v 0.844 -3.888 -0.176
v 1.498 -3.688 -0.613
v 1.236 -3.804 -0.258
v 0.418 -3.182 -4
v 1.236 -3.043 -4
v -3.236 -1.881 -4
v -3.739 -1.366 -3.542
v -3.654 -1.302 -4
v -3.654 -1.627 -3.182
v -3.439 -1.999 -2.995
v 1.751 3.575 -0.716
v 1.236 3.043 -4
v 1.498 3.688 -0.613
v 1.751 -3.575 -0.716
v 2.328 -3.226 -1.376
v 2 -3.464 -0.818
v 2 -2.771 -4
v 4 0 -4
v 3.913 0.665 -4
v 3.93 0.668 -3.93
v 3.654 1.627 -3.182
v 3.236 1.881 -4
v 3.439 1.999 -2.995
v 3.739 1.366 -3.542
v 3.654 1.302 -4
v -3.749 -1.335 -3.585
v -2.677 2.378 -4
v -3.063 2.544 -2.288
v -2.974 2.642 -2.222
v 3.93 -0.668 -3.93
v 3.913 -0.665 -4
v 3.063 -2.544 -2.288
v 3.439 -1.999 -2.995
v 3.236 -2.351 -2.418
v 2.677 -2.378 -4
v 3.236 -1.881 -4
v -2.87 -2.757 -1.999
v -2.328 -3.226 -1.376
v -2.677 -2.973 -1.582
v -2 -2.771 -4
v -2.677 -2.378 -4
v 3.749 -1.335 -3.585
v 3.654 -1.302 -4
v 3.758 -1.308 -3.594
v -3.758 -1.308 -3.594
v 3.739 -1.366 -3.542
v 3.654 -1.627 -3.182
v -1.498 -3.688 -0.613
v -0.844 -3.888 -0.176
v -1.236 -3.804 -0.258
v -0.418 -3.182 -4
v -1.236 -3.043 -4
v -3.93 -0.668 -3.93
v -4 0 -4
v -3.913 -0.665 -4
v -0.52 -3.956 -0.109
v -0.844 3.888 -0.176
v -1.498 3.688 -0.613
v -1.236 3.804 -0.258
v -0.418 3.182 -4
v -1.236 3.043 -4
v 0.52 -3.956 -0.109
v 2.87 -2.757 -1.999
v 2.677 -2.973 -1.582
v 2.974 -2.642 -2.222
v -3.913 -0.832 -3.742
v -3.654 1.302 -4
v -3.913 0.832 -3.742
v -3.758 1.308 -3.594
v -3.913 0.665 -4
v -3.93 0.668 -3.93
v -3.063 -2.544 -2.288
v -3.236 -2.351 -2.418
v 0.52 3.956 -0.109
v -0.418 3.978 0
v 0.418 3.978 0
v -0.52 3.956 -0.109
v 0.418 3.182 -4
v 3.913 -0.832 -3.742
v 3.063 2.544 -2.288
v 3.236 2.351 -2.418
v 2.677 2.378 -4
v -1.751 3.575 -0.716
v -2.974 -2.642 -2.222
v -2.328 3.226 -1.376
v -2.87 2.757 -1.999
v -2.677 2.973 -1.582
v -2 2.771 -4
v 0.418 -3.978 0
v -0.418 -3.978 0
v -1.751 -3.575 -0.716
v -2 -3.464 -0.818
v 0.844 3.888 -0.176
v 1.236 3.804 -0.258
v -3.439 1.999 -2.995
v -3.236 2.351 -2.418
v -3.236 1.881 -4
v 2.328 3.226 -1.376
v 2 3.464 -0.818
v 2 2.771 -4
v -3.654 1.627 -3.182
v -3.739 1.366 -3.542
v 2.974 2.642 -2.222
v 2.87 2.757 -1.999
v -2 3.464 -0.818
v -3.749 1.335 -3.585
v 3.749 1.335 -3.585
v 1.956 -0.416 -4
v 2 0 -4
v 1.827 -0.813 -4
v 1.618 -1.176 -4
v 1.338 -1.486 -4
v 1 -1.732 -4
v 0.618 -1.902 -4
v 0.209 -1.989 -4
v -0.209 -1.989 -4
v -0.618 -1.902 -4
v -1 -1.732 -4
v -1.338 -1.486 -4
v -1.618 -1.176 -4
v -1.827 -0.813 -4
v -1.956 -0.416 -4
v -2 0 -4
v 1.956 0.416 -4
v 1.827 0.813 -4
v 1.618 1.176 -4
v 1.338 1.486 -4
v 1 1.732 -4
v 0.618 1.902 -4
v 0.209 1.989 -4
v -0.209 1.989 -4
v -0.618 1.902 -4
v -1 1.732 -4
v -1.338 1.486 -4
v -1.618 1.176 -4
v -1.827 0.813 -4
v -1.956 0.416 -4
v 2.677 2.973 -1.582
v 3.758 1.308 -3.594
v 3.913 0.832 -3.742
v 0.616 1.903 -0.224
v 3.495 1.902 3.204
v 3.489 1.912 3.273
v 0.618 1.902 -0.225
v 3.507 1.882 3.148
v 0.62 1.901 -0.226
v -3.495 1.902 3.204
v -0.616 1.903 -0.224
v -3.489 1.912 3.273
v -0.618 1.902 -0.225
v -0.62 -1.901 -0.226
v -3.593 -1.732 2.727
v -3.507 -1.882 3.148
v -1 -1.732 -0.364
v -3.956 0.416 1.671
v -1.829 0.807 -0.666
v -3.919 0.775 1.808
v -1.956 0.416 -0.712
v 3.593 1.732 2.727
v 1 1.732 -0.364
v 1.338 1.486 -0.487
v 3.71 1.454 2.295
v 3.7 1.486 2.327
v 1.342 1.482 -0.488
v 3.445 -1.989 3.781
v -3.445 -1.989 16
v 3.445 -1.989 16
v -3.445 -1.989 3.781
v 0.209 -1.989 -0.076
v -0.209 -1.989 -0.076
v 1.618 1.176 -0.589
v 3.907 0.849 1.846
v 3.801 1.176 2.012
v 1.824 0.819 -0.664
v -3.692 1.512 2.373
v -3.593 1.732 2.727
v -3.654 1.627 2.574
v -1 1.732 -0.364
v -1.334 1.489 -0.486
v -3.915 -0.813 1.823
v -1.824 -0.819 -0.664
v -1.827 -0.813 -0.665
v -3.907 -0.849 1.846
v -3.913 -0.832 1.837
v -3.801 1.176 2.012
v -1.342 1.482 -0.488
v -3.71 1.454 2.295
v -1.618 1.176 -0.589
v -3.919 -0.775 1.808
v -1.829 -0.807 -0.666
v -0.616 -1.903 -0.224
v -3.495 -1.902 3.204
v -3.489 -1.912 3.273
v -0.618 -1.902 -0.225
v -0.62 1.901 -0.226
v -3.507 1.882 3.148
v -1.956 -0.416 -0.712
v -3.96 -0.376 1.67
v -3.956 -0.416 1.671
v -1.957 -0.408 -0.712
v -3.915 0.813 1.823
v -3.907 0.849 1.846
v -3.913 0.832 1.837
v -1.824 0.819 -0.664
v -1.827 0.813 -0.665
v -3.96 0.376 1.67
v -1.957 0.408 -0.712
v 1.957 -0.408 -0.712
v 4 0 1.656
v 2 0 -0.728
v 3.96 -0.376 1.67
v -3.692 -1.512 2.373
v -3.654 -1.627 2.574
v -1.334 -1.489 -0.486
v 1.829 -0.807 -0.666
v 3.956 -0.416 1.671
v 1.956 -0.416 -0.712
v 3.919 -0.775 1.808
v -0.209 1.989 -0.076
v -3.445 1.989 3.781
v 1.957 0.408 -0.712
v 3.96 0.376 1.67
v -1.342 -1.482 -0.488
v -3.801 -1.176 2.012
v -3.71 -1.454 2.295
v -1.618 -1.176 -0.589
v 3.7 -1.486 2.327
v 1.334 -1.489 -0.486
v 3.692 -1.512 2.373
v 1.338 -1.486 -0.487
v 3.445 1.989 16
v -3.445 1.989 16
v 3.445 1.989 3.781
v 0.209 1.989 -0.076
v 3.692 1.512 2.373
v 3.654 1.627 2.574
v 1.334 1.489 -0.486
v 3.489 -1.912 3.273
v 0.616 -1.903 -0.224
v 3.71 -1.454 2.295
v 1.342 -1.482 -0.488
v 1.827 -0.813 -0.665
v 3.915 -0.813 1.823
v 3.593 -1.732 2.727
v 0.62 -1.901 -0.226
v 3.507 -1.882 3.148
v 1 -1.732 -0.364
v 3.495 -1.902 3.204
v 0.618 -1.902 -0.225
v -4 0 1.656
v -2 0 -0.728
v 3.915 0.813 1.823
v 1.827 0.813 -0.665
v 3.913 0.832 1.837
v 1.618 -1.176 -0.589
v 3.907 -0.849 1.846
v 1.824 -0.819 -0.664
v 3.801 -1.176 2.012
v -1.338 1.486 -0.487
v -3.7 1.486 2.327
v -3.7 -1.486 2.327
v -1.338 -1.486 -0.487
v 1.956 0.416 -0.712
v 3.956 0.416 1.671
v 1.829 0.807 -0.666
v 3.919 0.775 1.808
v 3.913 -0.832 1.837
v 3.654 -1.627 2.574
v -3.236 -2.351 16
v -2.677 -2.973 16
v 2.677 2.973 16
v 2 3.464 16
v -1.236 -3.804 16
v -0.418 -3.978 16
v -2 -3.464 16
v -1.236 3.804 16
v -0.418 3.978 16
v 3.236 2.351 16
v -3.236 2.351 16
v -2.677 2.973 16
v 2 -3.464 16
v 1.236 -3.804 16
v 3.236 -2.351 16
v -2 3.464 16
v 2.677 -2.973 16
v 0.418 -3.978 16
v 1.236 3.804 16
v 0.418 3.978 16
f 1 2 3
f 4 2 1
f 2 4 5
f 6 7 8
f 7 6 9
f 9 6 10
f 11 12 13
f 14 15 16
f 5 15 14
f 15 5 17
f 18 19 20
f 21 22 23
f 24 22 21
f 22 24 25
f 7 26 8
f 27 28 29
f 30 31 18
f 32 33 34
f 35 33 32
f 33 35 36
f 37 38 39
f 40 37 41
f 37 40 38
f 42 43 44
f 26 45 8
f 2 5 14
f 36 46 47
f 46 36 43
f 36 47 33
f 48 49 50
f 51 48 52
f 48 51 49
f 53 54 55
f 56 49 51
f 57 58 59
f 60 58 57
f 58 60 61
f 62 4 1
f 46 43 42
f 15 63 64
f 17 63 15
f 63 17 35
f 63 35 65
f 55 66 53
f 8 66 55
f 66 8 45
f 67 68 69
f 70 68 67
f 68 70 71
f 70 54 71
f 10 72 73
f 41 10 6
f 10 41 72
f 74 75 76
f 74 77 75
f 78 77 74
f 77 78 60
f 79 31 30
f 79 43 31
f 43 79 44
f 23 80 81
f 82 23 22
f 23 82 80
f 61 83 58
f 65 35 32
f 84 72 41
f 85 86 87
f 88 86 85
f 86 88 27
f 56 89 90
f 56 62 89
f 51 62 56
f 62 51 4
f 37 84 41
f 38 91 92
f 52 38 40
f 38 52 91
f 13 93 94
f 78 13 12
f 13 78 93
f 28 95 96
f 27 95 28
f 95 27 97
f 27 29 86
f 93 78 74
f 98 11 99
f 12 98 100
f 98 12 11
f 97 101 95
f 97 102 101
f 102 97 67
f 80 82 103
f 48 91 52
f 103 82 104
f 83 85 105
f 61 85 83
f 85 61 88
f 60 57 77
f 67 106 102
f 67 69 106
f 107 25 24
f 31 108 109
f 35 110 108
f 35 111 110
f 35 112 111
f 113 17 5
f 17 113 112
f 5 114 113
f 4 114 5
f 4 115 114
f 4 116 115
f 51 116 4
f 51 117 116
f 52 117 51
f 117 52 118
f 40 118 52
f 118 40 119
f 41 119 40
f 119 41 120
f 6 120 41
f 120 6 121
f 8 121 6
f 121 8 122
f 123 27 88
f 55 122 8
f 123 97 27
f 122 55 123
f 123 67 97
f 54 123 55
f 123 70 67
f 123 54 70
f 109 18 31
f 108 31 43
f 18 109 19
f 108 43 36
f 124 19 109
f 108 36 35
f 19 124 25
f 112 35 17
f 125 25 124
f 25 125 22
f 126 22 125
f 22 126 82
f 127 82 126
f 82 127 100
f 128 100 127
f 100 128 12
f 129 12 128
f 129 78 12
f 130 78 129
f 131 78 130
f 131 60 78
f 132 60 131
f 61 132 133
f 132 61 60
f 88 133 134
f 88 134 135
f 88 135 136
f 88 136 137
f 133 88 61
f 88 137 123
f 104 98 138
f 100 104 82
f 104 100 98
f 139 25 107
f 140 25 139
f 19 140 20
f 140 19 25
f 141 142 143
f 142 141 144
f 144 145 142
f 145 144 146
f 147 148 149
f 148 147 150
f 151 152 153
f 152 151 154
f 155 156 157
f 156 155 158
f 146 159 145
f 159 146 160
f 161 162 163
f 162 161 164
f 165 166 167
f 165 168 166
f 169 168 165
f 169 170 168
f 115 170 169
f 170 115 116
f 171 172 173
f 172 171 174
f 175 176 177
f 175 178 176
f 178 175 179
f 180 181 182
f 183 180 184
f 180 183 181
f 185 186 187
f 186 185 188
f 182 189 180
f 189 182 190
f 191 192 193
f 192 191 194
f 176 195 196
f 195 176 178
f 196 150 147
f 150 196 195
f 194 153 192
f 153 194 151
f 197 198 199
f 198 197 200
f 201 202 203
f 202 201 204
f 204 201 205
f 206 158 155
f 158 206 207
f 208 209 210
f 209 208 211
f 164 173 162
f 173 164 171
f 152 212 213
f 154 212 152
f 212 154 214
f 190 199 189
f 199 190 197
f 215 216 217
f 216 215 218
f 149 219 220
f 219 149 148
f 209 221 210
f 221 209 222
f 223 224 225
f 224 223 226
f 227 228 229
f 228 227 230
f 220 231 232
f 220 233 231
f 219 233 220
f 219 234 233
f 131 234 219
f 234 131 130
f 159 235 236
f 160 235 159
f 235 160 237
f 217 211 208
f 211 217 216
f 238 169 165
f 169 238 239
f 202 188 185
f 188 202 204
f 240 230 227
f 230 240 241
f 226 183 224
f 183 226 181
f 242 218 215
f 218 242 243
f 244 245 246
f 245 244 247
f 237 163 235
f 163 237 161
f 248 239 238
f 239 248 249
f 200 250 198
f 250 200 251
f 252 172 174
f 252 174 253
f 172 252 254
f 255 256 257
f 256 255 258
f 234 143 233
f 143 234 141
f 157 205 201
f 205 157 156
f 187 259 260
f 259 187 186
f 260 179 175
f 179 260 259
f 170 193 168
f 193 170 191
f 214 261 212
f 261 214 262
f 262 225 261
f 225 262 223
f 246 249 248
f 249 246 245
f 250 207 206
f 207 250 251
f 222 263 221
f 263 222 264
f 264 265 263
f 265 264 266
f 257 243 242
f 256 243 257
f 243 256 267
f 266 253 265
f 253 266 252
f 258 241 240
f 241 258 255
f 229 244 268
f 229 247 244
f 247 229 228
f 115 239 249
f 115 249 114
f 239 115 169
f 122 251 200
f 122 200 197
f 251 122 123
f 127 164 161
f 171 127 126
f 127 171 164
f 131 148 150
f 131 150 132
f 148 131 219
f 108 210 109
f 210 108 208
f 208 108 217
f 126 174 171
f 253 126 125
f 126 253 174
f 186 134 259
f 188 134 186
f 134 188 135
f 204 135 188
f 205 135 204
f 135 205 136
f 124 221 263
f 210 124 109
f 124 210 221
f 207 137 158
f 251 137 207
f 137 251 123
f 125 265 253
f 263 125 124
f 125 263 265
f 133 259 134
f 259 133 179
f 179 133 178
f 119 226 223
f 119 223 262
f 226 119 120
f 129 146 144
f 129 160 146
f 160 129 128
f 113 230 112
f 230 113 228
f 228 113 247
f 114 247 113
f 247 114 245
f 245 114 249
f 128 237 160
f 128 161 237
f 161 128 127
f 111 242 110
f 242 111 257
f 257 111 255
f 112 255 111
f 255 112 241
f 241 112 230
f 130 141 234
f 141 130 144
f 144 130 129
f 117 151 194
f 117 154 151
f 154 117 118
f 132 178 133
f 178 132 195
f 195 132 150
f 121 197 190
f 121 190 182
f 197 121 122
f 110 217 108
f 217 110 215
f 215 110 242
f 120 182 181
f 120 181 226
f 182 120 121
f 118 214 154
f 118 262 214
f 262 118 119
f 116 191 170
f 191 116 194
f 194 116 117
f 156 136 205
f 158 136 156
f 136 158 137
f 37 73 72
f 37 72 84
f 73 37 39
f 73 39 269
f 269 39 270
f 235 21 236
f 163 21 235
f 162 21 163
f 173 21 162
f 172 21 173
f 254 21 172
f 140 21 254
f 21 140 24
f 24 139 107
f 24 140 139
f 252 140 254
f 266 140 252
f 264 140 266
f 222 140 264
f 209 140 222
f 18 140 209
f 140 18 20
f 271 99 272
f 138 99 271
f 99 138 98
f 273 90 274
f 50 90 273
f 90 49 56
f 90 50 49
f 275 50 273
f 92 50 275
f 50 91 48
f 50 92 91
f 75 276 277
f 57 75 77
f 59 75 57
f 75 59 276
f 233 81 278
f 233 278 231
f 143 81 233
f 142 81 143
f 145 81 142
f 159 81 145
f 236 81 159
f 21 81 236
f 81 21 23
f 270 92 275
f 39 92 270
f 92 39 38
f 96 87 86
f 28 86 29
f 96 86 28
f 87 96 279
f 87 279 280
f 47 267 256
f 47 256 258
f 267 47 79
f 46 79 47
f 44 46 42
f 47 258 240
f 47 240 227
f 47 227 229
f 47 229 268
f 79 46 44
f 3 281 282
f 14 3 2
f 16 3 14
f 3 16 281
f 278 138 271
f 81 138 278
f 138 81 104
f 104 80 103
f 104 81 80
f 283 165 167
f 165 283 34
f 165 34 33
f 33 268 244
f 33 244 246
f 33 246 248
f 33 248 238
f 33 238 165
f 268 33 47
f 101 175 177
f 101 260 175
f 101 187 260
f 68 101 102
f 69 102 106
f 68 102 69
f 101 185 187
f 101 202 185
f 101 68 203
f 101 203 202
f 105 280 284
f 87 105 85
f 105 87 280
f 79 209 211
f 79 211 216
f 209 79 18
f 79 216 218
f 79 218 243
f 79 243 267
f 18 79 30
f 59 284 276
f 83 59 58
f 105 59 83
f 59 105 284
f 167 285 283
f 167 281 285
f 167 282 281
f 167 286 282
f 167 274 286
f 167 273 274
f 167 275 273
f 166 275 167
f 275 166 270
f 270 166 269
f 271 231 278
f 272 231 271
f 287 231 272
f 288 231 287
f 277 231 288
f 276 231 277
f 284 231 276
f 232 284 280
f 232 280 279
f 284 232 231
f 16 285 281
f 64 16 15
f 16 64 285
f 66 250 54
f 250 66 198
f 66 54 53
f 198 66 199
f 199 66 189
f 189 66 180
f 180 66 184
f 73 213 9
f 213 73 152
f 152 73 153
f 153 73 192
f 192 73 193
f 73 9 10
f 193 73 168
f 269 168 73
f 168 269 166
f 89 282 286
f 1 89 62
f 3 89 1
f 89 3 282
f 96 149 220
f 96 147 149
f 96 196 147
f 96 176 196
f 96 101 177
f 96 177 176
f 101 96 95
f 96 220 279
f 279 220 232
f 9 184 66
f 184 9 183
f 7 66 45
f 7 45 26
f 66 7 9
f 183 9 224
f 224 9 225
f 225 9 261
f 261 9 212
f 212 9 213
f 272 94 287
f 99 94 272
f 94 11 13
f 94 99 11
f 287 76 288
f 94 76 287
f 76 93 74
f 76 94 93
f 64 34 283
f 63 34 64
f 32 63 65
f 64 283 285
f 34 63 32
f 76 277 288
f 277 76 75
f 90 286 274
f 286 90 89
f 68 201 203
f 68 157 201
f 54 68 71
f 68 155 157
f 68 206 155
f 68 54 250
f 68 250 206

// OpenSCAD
//
//  Copyright (C) 11-03-2014 Jasper den Ouden.
//
//  This is free software: you can redistribute it and/or modify
//  it under the terms of the GNU General Public License as published
//  by the Free Software Foundation, either version 3 of the License, or
//  (at your option) any later version.
//

//Rotating thing that keeps away the tube i have on the filament to prevent
// breaks.

$fs=0.2;

fr=2; //Radius of filament.(over-estimated)
R=20; t=2;

//TODO crap, CGAL does not like.

module leeway_spacer_plain()
{
    rotate([-90,0,0]) intersection()
    {   union()
        {   rotate_extrude() hull()
            {   circle(fr+t);
                translate([R-fr-t,0]) circle(fr+t);
            }
            translate([0,fr+t,0]) rotate([90,0,0]) cylinder(r=fr+t,h=R);
        }
        rotate([90,0,0]) difference()
        {   scale([1,0.8,1]) union()
            {   cylinder(r1=fr+t,r2=R,h=R);
                translate([0,0,-fr-t]) cylinder(r1=fr+t,r2=R/2,h=R+fr+t);
            }
            hull() for(a=[-40,0,40]) rotate([0,a,0]) cylinder(r=fr,h=2*R);
            translate([0,0,-R]) cylinder(r=fr,h=2*R);
        }
    }
}

//TODO pretification?

leeway_spacer_plain();
